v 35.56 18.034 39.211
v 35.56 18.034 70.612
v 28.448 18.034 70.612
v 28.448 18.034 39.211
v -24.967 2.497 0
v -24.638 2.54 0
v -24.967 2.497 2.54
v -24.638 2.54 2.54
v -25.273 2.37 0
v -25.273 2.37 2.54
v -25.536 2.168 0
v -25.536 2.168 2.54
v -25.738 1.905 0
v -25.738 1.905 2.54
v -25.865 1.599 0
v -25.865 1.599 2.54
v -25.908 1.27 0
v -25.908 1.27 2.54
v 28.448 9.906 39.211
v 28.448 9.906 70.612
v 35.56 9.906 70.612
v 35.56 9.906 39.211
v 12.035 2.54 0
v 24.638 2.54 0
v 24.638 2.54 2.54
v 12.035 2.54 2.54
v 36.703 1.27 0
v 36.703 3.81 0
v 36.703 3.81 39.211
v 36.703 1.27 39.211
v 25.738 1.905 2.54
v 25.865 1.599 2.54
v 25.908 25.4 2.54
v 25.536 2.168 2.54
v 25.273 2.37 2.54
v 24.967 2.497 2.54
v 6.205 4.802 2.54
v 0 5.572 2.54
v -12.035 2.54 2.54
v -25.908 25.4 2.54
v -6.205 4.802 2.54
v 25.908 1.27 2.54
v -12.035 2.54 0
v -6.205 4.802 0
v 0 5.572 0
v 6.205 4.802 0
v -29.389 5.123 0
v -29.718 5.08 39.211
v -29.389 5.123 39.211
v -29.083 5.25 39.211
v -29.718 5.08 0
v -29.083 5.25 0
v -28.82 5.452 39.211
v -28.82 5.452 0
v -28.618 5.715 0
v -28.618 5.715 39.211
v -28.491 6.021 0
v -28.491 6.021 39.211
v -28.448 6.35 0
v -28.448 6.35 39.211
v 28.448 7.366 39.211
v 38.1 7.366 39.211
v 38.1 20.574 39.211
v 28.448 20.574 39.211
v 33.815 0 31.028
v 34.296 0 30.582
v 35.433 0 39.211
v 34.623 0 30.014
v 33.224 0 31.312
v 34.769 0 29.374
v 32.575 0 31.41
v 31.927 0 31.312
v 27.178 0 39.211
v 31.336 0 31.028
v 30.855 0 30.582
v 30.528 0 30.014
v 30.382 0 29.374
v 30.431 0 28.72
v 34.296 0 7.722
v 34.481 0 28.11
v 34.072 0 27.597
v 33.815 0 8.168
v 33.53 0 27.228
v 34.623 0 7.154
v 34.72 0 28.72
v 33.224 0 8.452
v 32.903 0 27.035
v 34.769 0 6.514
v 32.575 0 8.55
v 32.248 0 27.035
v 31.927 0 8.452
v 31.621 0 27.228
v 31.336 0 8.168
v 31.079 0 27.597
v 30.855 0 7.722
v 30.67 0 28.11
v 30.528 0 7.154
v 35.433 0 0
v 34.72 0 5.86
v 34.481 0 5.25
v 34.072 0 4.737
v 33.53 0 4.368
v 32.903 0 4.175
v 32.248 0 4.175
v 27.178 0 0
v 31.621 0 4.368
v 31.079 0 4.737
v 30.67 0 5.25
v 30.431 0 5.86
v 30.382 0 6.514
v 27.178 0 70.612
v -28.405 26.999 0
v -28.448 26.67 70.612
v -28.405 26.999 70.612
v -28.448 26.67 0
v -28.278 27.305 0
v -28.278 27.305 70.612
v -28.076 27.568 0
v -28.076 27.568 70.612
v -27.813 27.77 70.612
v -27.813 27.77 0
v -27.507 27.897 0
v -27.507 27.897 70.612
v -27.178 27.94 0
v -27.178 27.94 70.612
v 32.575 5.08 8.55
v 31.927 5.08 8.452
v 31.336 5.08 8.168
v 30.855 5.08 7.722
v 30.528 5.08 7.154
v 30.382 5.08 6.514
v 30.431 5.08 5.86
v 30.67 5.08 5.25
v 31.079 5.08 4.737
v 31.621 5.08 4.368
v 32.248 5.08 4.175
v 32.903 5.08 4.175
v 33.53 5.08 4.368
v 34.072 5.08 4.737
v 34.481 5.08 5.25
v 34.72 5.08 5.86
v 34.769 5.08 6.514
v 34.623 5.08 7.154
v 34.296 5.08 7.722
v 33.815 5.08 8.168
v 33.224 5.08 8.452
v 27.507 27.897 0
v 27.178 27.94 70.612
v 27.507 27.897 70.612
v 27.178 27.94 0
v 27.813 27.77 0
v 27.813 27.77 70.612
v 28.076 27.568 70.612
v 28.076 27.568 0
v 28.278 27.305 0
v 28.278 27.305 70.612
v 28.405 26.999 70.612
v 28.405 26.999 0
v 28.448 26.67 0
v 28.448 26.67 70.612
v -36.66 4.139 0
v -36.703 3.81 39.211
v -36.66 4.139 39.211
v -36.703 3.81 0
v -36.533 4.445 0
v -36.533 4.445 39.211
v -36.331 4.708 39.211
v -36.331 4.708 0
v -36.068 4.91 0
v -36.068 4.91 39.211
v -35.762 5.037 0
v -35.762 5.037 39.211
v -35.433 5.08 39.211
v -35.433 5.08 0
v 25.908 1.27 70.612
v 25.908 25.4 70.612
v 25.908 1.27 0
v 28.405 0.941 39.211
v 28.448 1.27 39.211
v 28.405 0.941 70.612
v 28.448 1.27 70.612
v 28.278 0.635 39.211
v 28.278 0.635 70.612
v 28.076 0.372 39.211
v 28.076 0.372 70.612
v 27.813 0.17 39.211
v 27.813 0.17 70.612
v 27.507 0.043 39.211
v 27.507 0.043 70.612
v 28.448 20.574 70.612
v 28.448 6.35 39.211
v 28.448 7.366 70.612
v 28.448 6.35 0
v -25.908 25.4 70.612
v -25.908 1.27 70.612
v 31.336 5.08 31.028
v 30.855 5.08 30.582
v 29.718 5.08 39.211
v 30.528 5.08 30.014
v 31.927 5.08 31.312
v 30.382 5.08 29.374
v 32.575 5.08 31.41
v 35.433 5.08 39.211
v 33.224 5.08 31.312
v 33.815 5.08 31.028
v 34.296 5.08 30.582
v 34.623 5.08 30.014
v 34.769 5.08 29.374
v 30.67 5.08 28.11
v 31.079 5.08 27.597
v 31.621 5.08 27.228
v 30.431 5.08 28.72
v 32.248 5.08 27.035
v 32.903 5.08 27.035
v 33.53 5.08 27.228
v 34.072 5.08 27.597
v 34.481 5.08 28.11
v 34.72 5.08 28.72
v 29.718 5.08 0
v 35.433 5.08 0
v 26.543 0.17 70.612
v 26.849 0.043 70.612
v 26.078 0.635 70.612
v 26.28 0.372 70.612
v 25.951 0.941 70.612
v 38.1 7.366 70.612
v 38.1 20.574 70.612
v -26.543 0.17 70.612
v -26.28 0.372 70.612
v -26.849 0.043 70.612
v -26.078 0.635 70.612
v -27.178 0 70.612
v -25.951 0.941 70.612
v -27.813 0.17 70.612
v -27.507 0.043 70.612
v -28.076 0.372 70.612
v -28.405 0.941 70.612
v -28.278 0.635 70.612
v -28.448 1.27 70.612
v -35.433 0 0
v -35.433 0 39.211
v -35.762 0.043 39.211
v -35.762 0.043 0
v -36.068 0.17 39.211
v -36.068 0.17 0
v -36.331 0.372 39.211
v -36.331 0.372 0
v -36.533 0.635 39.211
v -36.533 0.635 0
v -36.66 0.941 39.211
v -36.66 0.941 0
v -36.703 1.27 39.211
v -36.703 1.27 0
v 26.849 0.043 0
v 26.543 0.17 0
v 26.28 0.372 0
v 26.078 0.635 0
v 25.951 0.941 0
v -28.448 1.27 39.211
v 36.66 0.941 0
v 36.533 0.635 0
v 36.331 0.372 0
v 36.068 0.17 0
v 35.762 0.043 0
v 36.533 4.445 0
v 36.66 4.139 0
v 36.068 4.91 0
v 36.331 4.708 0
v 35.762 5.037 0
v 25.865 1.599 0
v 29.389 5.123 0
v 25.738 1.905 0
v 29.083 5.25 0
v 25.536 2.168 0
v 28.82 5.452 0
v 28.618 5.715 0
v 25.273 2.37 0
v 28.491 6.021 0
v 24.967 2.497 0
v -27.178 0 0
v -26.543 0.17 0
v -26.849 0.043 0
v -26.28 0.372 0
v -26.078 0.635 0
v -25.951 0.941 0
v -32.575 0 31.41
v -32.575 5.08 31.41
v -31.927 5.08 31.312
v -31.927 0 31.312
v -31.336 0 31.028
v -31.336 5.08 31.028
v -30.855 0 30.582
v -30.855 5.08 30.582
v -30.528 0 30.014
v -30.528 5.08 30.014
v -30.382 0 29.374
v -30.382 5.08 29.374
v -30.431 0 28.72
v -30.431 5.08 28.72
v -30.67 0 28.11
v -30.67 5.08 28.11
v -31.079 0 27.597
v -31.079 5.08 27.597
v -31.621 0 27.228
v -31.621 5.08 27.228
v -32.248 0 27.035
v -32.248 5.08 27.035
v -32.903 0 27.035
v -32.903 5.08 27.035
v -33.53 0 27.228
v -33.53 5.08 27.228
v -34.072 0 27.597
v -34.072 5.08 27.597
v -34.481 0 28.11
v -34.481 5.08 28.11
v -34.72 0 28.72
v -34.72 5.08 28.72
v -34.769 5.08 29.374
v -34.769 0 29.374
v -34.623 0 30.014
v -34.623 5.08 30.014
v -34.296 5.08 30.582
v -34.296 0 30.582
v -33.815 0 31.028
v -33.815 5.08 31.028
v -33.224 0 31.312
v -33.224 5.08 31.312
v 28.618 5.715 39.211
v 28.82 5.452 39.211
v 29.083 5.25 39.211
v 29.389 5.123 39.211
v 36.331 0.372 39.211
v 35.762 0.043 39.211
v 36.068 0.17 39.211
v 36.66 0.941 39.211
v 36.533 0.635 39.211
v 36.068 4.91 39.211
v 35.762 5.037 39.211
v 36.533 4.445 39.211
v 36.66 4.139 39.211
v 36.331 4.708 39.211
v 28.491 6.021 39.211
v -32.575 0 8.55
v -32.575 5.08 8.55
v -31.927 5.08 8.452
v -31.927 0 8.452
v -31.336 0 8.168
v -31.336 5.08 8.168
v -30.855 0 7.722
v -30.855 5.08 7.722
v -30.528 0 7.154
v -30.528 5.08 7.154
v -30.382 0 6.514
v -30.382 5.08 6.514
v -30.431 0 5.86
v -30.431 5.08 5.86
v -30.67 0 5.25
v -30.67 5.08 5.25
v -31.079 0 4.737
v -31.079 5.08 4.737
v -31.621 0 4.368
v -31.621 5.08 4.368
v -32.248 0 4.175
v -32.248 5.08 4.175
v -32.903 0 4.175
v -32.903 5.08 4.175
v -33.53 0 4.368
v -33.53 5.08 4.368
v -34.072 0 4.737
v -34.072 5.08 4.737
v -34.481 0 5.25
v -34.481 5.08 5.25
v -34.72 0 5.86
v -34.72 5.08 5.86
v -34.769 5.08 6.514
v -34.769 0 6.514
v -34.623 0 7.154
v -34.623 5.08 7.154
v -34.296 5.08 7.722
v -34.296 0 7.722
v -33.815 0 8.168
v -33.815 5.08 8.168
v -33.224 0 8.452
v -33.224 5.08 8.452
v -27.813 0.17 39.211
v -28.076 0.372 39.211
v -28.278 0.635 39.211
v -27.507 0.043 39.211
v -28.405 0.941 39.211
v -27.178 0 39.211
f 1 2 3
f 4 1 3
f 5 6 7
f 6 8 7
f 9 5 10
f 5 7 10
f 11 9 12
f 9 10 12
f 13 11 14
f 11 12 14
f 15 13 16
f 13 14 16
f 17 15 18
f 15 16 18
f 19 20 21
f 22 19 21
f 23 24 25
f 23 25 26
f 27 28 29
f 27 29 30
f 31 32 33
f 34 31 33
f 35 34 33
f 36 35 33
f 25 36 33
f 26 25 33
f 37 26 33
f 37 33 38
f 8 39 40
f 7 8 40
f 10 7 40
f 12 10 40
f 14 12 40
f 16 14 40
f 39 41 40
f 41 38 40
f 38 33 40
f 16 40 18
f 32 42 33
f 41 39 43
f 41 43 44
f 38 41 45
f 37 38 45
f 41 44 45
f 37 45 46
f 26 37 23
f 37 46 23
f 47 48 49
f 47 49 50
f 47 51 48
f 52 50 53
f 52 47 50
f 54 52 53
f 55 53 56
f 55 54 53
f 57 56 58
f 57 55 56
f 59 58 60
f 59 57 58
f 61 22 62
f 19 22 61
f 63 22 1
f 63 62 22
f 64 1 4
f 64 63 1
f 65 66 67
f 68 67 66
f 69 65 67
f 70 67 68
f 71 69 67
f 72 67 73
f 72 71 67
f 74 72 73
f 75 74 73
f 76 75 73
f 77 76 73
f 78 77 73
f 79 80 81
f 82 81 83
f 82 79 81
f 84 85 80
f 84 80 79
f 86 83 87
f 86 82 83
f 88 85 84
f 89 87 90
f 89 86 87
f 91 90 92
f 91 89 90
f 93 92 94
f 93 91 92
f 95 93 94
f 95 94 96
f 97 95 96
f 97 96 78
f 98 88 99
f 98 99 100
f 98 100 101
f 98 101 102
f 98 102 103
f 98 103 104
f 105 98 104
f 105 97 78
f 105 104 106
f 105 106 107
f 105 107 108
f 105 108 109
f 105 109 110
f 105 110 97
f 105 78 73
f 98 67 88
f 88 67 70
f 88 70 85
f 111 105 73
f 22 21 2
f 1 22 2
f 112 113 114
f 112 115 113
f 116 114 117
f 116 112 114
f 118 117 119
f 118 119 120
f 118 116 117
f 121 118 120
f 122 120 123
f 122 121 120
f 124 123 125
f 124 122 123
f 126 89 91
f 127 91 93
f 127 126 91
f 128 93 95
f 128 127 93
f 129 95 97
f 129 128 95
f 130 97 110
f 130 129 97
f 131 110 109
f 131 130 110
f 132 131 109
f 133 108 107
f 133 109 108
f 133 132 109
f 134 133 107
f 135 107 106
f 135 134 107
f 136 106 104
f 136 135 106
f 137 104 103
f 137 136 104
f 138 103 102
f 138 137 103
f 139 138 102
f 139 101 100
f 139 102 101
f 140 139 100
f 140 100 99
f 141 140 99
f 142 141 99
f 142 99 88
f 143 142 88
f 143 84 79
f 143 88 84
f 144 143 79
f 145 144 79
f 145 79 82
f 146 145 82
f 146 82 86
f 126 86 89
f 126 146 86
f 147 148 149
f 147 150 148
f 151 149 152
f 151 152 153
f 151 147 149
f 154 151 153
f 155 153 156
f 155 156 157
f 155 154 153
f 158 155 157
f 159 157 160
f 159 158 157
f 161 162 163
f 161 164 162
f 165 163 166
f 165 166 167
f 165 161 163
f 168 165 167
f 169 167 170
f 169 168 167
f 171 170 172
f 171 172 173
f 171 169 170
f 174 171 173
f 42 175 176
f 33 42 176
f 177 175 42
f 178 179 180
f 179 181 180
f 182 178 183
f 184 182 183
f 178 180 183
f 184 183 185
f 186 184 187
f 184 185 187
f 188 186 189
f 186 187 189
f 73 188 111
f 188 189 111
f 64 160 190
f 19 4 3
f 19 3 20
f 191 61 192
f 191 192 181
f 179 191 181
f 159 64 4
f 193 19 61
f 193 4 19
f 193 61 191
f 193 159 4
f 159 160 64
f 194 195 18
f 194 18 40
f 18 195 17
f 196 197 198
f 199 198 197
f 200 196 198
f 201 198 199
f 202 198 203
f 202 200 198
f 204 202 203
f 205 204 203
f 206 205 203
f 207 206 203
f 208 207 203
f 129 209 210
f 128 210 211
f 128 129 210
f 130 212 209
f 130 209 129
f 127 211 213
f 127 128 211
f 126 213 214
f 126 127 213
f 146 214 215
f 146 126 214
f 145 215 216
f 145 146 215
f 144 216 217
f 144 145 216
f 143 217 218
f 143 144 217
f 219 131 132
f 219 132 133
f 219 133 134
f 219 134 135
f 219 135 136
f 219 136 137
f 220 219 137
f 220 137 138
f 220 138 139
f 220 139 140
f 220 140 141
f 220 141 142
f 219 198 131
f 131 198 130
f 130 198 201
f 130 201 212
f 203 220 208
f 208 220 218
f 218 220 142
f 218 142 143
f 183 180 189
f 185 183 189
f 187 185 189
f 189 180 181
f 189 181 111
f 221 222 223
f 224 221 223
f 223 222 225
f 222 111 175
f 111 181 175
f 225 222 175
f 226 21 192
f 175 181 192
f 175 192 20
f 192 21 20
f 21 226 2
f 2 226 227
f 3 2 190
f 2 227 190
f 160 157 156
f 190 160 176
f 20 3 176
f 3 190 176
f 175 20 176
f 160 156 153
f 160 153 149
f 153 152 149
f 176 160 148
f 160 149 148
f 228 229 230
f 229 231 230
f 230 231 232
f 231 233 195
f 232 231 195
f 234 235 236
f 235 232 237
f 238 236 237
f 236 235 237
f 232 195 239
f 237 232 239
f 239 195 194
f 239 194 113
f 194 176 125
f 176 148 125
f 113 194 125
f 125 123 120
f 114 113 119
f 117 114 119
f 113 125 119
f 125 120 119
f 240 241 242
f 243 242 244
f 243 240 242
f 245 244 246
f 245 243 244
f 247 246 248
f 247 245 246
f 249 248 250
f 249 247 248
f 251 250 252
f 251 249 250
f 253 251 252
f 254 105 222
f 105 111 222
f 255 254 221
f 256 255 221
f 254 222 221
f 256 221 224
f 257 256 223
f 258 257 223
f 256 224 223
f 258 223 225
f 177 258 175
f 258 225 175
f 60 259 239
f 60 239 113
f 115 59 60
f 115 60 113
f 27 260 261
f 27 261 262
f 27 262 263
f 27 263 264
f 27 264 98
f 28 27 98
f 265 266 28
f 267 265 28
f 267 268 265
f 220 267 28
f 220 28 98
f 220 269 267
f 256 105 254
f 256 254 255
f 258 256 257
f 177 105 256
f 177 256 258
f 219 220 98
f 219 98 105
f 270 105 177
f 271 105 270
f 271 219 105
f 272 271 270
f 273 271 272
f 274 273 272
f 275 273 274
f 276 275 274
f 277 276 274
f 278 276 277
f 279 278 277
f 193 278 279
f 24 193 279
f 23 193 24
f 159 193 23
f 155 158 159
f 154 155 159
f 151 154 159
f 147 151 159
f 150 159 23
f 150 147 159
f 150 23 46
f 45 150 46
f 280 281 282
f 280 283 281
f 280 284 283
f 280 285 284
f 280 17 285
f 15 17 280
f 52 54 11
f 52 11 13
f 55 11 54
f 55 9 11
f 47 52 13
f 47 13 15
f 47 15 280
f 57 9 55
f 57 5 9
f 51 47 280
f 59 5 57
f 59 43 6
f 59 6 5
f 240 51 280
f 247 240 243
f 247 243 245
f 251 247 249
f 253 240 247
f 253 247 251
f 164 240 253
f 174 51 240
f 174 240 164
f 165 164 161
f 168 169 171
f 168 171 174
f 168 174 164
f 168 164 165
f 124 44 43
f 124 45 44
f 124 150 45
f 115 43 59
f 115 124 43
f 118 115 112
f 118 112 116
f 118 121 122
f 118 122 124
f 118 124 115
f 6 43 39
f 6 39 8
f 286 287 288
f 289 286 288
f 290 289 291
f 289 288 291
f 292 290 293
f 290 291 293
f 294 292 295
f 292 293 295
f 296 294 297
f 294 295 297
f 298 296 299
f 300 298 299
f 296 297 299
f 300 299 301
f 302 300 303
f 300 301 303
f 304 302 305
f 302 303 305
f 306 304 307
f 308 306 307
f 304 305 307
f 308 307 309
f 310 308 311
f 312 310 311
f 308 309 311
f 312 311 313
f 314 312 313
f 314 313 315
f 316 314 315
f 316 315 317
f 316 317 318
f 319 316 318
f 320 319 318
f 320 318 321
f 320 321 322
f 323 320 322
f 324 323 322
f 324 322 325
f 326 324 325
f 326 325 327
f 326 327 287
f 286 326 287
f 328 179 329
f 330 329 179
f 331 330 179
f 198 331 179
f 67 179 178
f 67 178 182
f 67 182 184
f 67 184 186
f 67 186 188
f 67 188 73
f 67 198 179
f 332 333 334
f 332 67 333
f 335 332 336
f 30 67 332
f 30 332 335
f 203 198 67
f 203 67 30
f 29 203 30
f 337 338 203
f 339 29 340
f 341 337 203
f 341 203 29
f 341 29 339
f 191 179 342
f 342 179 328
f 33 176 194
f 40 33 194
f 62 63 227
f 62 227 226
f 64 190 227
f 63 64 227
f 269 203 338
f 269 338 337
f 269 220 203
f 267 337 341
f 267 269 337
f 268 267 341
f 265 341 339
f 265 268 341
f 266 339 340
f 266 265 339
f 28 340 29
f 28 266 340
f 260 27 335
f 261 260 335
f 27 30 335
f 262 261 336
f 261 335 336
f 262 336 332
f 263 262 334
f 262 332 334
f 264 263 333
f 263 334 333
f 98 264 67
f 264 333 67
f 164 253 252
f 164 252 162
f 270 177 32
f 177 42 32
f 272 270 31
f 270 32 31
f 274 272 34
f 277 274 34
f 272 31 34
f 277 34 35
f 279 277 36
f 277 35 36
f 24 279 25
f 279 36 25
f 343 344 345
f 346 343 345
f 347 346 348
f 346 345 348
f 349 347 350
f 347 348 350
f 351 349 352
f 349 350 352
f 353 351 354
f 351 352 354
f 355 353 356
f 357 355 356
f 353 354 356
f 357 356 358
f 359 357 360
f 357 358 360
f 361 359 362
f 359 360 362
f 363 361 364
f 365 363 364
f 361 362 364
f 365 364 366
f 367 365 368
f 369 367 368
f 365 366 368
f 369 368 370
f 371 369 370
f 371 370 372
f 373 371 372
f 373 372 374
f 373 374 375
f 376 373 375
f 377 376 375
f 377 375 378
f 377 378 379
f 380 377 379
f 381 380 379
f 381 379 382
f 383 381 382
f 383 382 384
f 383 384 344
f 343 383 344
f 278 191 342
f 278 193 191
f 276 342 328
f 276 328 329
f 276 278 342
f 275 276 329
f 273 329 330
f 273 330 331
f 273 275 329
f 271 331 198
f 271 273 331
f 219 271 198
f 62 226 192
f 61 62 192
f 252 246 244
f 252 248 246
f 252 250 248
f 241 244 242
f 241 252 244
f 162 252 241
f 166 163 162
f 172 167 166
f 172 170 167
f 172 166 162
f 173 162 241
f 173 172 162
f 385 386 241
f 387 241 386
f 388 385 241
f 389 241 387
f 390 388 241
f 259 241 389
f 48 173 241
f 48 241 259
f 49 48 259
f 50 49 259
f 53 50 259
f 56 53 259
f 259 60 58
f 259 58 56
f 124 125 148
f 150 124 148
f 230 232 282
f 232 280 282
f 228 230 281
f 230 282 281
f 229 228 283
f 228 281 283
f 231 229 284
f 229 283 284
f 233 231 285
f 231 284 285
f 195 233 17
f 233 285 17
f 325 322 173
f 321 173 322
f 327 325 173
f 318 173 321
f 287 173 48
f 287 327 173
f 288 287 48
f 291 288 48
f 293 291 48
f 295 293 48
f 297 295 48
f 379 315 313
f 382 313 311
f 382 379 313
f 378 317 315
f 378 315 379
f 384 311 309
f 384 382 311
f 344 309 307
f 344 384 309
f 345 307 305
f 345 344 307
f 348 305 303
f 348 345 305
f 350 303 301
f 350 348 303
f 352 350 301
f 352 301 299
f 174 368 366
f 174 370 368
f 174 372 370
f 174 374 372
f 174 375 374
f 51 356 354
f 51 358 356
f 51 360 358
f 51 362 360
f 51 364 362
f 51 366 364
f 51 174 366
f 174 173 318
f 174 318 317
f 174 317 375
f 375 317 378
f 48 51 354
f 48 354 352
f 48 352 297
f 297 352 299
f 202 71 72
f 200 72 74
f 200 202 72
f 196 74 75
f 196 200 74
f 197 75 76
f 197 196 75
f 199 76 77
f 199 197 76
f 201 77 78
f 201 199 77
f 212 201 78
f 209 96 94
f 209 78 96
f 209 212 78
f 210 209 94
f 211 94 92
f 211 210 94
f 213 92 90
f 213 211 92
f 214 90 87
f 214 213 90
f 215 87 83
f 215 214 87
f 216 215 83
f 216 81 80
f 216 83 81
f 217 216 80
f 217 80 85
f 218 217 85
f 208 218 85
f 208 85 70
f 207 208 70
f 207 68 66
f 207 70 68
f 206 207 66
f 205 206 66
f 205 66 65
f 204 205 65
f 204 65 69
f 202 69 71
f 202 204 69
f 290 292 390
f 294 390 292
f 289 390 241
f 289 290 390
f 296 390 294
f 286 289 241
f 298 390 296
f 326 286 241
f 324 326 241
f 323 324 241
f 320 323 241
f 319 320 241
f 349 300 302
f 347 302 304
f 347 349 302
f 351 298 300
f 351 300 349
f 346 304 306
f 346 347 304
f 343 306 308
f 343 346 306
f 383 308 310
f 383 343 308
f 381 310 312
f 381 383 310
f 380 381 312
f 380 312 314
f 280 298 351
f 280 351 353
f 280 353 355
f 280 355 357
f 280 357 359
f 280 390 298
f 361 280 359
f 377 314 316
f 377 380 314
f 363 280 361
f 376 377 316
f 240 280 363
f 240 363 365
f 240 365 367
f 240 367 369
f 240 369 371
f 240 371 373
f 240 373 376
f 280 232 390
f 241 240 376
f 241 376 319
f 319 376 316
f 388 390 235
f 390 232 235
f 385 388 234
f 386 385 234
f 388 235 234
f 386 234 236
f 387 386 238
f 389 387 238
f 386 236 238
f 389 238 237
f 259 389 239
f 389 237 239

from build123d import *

# Parameters (mm, degrees)
BOSS_EXTRUDE1_DEPTH = 70.612
SKETCH2_R           = 2.2
CUT_EXTRUDE1_DEPTH  = 83.799422419
SKETCH3_W           = 8.255
SKETCH3_H           = 31.401404102
CUT_EXTRUDE2_DEPTH  = 83.799422419
BOSS_EXTRUDE3_DEPTH = 2.54
CUT_EXTRUDE6_DEPTH  = 2.54
SKETCH9_W           = 51.816
SKETCH9_H           = 2.54
CUT_EXTRUDE7_DEPTH  = 2.54
FILLET1_R           = 1.27
FILLET2_R           = 1.27
BOSS_EXTRUDE4_DEPTH = 31.401404102


with BuildPart() as part:
    # Sketch1 → Boss-Extrude1 (new body)
    with BuildSketch(Plane.XY):
        Polygon((25.908, 25.4), (-25.908, 25.4), (-25.908, 0), (-36.703, 0), (-36.703, 5.08), (-28.448, 5.08), (-28.448, 27.94), (28.448, 27.94), (28.448, 5.08), (36.703, 5.08), (36.703, 0), (25.908, 0), align=None)
    extrude(amount=BOSS_EXTRUDE1_DEPTH)

    # Sketch2 → Cut-Extrude1 (cut, through all)
    with BuildSketch(Plane(origin=(0, 5.08, 0), x_dir=(1, 0, 0), z_dir=(0, 1, 0))):
        with Locations(Location((-32.5755, -6.35, 0), (0, 0, 270))):
            Circle(SKETCH2_R)
        with Locations(Location((-32.5755, -29.21, 0), (0, 0, 270))):
            Circle(SKETCH2_R)
    cut_extrude1 = extrude(amount=-CUT_EXTRUDE1_DEPTH, mode=Mode.SUBTRACT)

    # Mirror1: Cut-Extrude1 across plane
    add(cut_extrude1.mirror(Plane(origin=(0, 0, 0), x_dir=(0, 0, 1), z_dir=(1, 0, 0))), mode=Mode.SUBTRACT)

    # Sketch3 → Cut-Extrude2 (cut, through all)
    with BuildSketch(Plane(origin=(0, 5.08, 0), x_dir=(1, 0, 0), z_dir=(0, 1, 0))):
        with Locations((-32.5755, -54.911297949)):
            Rectangle(SKETCH3_W, SKETCH3_H)
        with Locations((32.5755, -54.911297949)):
            Rectangle(SKETCH3_W, SKETCH3_H)
    extrude(amount=-CUT_EXTRUDE2_DEPTH, mode=Mode.SUBTRACT)

    # Sketch6 → Boss-Extrude3 (add)
    with BuildSketch(Plane(origin=(0, 0, 0), x_dir=(-1, 0, 0), z_dir=(0, 0, -1))):
        Polygon((-25.908, 0), (25.908, 0), (36.703, 0), (36.703, 5.08), (28.448, 5.08), (28.448, 27.94), (-28.448, 27.94), (-28.448, 5.08), (-36.703, 5.08), (-36.703, 0), align=None)
    extrude(amount=-BOSS_EXTRUDE3_DEPTH)

    # Sketch8 → Cut-Extrude6 (cut)
    with BuildSketch(Plane(origin=(0, 0, 0), x_dir=(-1, 0, 0), z_dir=(0, 0, -1))):
        with BuildLine():
            Line((-15.875, 0), (15.875, 0))
            ThreePointArc((15.875, 0), (0, 5.572131355), (-15.875, 0))
        make_face()
    extrude(amount=-CUT_EXTRUDE6_DEPTH, mode=Mode.SUBTRACT)

    # Sketch9 → Cut-Extrude7 (cut)
    with BuildSketch(Plane(origin=(0, 0, 0), x_dir=(-1, 0, 0), z_dir=(0, 0, -1))):
        with Locations((0, 1.27)):
            Rectangle(SKETCH9_W, SKETCH9_H)
    extrude(amount=-CUT_EXTRUDE7_DEPTH, mode=Mode.SUBTRACT)

    # Fillet1
    fillet1_edges = [part.edges().sort_by_distance(p)[0] for p in [
        (-28.448, 5.08, 19.605297949),
        (28.448, 5.08, 19.605297949),
        (36.703, 0, 19.605297949),
        (36.703, 5.08, 19.605297949),
        (-36.703, 5.08, 19.605297949),
        (-36.703, 0, 19.605297949),
        (28.448, 0, 54.911297949),
        (25.908, 0, 35.306),
        (-25.908, 0, 35.306),
        (-28.448, 0, 54.911297949),
        (28.448, 27.94, 35.306),
        (-28.448, 27.94, 35.306),
    ]]
    fillet(fillet1_edges, radius=FILLET1_R - 0.0001)  # a hair under: the kernel refuses the full size

    # Fillet2
    fillet2_edges = [part.edges().sort_by_distance(p)[0] for p in [
        (-25.908, 2.54, 1.27),
        (25.908, 2.54, 1.27),
    ]]
    fillet(fillet2_edges, radius=FILLET2_R)

    # Sketch10 → Boss-Extrude4 (add)
    with BuildSketch(Plane.XY.offset(70.612)):
        Polygon((28.448, 20.574), (38.1, 20.574), (38.1, 7.366), (28.448, 7.366), (28.448, 9.906), (35.56, 9.906), (35.56, 18.034), (28.448, 18.034), align=None)
    extrude(amount=-BOSS_EXTRUDE4_DEPTH)


solid = part.part
